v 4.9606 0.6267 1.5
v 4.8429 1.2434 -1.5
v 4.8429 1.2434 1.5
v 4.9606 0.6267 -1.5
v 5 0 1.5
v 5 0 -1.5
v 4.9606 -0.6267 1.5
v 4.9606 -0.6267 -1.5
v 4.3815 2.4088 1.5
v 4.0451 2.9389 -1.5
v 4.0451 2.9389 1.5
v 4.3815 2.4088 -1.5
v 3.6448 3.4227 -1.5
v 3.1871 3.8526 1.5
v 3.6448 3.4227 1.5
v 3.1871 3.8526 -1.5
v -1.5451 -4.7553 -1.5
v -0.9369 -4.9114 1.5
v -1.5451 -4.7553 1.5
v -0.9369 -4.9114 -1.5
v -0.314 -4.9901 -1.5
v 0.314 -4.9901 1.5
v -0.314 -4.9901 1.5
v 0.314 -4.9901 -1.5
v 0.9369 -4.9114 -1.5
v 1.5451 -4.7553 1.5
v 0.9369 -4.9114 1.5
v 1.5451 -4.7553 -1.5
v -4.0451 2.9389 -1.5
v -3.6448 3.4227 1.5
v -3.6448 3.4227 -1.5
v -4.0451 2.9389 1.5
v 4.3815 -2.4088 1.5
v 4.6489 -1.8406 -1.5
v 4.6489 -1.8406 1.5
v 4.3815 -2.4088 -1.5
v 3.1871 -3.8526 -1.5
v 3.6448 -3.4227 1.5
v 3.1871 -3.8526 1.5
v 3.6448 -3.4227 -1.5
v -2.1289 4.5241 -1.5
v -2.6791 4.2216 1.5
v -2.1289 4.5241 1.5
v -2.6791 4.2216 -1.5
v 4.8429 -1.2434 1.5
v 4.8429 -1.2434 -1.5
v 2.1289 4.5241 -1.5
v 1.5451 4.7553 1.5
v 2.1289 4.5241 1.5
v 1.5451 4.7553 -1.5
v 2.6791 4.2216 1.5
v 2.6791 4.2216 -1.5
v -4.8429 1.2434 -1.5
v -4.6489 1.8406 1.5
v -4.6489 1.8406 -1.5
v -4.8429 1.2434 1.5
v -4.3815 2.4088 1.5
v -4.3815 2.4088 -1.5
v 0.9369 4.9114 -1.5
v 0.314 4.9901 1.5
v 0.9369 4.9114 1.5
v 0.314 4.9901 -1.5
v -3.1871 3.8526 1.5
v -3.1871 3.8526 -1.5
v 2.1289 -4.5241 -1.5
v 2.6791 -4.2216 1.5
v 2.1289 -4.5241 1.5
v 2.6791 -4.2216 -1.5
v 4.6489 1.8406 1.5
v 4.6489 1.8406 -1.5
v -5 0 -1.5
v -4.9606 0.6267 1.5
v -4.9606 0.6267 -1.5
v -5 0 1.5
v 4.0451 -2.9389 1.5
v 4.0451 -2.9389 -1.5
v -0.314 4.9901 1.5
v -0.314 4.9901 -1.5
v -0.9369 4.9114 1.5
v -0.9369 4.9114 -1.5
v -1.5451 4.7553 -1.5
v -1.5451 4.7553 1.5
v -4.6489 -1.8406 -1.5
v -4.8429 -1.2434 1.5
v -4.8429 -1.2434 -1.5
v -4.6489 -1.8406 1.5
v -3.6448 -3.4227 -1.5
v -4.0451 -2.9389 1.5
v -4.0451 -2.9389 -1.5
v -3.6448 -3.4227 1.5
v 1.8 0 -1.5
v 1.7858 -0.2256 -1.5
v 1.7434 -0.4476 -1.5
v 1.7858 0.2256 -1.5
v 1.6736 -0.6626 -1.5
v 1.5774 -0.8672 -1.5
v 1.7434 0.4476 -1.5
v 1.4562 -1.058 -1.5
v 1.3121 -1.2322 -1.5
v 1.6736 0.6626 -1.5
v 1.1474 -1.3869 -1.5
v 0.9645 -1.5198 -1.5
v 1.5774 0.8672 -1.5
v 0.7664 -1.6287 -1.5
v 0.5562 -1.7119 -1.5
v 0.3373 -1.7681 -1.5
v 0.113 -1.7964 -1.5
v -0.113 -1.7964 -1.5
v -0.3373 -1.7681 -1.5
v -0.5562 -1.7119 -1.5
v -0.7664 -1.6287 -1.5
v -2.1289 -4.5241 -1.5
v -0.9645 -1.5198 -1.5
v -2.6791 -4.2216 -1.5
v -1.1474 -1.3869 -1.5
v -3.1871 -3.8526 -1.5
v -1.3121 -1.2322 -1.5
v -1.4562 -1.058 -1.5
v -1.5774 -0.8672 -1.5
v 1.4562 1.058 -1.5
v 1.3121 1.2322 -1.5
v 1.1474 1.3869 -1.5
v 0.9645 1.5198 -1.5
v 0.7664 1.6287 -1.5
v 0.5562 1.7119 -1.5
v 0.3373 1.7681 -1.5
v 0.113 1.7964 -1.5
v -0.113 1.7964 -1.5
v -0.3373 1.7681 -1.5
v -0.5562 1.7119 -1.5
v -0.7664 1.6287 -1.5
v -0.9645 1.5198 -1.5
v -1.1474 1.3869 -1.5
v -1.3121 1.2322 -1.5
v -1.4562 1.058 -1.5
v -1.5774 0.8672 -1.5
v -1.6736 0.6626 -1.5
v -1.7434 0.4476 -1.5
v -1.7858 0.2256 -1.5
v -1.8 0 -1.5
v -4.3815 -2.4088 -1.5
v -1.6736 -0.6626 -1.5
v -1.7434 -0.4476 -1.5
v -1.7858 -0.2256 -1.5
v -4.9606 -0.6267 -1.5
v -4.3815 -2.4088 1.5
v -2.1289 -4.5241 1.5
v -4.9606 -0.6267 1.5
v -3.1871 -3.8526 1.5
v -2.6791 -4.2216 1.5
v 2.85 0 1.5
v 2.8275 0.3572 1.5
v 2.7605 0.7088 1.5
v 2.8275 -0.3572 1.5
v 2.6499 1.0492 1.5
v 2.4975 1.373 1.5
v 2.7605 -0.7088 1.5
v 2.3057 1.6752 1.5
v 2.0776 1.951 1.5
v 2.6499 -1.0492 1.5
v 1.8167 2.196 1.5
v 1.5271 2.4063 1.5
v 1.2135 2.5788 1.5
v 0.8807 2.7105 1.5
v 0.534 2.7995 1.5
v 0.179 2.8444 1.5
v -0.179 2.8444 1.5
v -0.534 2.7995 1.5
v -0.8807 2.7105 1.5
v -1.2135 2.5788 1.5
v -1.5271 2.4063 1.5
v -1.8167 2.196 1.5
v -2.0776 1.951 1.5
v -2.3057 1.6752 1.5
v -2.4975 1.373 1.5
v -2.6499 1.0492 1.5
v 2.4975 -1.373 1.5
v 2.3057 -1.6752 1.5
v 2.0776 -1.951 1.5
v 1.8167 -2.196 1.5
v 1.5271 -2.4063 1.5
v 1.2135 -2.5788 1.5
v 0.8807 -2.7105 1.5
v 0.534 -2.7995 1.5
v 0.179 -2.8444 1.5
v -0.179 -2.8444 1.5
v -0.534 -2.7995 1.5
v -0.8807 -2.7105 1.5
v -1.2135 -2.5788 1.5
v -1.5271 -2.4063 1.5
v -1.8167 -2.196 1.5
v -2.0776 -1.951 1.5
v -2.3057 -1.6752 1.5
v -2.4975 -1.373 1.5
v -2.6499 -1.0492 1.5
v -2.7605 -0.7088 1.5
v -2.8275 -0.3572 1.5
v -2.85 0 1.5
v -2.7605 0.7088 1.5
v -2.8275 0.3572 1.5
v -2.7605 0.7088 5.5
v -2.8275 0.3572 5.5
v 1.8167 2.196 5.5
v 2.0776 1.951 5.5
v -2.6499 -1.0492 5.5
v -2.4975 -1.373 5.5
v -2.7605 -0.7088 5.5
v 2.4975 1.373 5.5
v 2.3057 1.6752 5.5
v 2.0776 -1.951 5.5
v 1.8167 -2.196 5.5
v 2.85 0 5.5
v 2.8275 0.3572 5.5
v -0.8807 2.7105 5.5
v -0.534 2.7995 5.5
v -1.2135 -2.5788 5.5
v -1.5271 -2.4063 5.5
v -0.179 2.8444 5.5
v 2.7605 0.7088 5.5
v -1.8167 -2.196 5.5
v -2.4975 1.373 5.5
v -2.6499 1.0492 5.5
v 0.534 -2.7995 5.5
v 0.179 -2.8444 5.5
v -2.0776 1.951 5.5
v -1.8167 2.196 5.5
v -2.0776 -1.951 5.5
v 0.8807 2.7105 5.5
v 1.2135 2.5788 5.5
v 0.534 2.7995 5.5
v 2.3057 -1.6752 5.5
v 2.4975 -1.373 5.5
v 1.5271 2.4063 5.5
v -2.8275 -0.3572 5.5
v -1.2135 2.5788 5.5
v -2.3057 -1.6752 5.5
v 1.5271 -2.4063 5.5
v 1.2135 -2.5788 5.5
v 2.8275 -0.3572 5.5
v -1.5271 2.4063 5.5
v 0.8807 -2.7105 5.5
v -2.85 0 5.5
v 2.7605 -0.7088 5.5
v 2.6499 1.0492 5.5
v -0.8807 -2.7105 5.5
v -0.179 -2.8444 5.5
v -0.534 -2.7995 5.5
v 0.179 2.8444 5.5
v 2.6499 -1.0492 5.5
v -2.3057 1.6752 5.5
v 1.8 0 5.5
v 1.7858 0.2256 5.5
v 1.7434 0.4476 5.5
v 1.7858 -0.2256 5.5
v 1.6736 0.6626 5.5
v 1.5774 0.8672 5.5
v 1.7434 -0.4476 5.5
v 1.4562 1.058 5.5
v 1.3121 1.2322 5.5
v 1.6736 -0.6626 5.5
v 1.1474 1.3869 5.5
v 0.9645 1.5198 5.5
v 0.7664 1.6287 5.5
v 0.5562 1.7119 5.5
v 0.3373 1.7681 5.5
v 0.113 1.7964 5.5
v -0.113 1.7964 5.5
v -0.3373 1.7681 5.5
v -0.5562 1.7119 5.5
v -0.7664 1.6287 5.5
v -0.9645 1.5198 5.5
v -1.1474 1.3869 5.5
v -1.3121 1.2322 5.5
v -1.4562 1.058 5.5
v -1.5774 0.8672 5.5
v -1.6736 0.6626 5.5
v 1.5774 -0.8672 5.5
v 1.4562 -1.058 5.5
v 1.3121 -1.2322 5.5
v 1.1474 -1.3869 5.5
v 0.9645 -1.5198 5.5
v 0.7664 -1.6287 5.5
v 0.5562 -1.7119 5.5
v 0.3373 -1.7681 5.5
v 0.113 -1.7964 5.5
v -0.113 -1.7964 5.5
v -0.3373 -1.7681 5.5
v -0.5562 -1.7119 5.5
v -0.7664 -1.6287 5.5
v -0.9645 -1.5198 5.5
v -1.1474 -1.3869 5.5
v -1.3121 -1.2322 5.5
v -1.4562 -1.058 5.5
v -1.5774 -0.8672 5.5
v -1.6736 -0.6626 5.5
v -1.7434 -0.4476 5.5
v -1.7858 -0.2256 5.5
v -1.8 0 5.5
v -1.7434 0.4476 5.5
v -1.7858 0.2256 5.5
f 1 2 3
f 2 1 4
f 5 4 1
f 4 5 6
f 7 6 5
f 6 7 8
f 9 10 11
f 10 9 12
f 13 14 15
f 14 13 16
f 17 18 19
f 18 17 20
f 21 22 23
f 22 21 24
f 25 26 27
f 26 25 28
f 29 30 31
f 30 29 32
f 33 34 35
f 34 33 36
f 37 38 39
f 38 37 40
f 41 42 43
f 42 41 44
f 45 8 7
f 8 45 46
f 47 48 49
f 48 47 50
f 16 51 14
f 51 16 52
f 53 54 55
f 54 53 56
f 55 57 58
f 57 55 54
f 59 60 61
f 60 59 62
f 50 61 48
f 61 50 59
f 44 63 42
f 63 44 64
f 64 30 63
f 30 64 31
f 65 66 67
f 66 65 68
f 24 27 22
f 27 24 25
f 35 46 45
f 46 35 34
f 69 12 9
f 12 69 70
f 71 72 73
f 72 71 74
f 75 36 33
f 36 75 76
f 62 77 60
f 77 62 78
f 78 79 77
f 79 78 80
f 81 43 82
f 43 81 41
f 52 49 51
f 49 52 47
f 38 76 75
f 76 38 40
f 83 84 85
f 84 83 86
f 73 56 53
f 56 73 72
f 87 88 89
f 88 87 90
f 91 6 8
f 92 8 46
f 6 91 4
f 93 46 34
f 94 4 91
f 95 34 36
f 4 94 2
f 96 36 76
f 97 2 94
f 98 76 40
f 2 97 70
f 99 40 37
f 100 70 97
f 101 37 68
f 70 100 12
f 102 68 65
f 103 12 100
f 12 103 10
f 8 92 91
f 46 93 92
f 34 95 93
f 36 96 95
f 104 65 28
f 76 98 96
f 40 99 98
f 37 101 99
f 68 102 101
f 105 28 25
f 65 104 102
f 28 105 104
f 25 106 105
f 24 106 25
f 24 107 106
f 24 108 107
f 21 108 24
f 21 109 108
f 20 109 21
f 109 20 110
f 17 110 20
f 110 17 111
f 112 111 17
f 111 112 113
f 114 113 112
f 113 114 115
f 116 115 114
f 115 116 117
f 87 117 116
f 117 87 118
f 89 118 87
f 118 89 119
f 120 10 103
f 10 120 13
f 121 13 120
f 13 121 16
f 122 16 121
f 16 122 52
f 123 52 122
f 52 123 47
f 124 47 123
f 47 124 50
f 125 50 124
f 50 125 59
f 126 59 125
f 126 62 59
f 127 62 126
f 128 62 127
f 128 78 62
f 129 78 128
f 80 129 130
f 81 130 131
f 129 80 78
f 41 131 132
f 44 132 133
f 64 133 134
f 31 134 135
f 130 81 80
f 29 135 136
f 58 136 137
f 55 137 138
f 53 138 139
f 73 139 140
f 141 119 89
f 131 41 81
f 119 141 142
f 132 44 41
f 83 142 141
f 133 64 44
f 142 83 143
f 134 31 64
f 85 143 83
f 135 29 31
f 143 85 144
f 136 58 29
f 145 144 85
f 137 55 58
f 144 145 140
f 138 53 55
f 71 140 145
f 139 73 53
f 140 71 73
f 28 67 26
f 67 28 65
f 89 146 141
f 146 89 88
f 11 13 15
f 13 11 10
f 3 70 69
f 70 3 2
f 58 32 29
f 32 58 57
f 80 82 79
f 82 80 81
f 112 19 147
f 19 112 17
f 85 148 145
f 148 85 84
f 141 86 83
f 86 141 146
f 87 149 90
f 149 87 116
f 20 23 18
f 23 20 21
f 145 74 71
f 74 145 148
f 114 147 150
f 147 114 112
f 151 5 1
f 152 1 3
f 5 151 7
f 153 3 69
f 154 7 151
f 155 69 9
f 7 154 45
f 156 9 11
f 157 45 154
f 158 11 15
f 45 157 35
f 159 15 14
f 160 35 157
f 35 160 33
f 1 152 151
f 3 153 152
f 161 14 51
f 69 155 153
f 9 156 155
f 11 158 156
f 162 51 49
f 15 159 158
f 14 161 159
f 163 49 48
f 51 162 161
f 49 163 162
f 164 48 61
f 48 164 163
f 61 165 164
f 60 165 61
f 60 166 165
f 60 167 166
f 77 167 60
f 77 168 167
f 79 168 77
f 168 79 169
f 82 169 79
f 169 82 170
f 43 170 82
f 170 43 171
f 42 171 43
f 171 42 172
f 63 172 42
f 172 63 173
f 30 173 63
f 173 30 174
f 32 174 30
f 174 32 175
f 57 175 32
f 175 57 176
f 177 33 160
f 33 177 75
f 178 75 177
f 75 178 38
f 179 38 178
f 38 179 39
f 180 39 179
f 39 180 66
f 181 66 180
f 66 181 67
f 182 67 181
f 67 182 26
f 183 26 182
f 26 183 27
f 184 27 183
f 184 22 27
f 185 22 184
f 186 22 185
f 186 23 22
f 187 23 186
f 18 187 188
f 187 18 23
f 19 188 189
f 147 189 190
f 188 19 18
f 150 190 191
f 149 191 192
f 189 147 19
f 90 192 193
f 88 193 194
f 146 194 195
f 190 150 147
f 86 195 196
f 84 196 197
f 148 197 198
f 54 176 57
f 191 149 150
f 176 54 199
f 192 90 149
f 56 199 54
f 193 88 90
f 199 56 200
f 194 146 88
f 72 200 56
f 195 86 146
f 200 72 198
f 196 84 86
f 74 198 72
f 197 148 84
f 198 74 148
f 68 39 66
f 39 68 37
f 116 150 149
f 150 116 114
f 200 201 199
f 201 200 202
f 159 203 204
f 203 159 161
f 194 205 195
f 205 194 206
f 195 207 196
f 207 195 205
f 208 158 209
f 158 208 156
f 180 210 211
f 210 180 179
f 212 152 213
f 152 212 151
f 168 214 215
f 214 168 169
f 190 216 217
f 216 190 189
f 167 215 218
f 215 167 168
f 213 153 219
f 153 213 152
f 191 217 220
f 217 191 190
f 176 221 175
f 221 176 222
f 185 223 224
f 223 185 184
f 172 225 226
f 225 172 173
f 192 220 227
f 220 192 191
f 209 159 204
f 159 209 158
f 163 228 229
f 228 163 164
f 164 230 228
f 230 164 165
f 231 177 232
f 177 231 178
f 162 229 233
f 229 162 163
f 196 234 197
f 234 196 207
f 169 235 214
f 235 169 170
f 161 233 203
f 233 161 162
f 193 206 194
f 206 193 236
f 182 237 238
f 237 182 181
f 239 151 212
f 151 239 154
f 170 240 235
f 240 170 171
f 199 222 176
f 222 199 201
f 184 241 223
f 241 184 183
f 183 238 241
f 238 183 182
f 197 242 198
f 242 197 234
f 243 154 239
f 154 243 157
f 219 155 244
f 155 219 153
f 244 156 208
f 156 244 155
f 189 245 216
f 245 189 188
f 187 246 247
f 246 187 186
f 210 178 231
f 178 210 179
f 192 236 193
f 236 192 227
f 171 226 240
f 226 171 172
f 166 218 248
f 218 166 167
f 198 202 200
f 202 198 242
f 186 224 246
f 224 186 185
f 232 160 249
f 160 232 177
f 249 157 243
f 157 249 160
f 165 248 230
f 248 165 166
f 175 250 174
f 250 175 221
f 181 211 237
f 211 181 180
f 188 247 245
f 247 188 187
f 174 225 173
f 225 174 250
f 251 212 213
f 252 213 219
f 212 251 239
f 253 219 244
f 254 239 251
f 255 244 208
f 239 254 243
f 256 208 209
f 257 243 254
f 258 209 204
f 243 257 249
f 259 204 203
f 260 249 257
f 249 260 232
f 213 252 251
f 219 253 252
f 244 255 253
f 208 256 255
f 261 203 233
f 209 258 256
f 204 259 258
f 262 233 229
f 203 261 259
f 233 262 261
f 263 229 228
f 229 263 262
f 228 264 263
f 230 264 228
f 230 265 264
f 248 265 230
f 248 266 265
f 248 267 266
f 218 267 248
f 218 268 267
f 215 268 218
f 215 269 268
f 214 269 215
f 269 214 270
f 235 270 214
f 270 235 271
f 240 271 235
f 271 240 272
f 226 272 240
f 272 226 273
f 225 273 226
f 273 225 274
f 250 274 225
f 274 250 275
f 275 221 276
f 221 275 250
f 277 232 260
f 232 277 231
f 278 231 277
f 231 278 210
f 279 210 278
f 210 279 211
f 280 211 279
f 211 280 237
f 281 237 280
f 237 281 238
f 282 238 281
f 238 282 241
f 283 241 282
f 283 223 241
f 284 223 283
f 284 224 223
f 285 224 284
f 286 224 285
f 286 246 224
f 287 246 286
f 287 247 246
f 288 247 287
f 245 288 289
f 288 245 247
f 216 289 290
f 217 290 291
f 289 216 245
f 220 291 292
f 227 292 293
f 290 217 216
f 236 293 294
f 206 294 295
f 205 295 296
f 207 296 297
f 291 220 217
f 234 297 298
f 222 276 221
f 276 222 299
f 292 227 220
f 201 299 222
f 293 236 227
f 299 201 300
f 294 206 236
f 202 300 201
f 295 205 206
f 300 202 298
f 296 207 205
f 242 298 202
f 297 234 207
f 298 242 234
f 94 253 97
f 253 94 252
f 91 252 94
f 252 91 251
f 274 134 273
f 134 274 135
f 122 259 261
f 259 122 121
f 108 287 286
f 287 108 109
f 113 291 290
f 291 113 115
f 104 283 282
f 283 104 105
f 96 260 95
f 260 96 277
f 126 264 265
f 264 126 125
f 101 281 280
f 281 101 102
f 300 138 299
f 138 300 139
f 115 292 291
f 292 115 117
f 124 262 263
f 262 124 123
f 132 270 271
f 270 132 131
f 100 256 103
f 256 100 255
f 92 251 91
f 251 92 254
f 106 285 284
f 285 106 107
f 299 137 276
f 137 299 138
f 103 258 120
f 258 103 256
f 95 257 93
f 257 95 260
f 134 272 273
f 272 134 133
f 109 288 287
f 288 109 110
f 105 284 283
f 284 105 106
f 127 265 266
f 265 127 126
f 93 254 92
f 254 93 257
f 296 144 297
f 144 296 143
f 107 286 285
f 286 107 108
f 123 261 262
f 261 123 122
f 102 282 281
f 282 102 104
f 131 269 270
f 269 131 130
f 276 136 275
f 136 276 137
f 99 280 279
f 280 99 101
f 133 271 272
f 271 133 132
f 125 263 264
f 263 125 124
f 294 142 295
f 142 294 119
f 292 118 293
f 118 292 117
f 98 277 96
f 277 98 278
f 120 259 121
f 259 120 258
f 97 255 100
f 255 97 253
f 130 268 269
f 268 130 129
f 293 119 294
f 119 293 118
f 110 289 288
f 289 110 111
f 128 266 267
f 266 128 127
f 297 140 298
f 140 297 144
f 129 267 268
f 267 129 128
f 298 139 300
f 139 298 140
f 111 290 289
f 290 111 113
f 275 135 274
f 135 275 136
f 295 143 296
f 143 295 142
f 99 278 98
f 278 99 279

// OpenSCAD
$fn = 50;


difference() {
	union() {
		translate(v = [0, 0, -1.5000000000]) {
			rotate(a = [0, 0, 0]) {
				cylinder(h = 3, r = 5.0000000000);
			}
		}
		translate(v = [0, 0, -1.5000000000]) {
			rotate(a = [0, 0, 0]) {
				cylinder(h = 7, r = 2.8500000000);
			}
		}
	}
	union() {
		translate(v = [0, 0, -125.0000000000]) {
			rotate(a = [0, 0, 0]) {
				cylinder(h = 250, r = 1.8000000000);
			}
		}
	}
}
